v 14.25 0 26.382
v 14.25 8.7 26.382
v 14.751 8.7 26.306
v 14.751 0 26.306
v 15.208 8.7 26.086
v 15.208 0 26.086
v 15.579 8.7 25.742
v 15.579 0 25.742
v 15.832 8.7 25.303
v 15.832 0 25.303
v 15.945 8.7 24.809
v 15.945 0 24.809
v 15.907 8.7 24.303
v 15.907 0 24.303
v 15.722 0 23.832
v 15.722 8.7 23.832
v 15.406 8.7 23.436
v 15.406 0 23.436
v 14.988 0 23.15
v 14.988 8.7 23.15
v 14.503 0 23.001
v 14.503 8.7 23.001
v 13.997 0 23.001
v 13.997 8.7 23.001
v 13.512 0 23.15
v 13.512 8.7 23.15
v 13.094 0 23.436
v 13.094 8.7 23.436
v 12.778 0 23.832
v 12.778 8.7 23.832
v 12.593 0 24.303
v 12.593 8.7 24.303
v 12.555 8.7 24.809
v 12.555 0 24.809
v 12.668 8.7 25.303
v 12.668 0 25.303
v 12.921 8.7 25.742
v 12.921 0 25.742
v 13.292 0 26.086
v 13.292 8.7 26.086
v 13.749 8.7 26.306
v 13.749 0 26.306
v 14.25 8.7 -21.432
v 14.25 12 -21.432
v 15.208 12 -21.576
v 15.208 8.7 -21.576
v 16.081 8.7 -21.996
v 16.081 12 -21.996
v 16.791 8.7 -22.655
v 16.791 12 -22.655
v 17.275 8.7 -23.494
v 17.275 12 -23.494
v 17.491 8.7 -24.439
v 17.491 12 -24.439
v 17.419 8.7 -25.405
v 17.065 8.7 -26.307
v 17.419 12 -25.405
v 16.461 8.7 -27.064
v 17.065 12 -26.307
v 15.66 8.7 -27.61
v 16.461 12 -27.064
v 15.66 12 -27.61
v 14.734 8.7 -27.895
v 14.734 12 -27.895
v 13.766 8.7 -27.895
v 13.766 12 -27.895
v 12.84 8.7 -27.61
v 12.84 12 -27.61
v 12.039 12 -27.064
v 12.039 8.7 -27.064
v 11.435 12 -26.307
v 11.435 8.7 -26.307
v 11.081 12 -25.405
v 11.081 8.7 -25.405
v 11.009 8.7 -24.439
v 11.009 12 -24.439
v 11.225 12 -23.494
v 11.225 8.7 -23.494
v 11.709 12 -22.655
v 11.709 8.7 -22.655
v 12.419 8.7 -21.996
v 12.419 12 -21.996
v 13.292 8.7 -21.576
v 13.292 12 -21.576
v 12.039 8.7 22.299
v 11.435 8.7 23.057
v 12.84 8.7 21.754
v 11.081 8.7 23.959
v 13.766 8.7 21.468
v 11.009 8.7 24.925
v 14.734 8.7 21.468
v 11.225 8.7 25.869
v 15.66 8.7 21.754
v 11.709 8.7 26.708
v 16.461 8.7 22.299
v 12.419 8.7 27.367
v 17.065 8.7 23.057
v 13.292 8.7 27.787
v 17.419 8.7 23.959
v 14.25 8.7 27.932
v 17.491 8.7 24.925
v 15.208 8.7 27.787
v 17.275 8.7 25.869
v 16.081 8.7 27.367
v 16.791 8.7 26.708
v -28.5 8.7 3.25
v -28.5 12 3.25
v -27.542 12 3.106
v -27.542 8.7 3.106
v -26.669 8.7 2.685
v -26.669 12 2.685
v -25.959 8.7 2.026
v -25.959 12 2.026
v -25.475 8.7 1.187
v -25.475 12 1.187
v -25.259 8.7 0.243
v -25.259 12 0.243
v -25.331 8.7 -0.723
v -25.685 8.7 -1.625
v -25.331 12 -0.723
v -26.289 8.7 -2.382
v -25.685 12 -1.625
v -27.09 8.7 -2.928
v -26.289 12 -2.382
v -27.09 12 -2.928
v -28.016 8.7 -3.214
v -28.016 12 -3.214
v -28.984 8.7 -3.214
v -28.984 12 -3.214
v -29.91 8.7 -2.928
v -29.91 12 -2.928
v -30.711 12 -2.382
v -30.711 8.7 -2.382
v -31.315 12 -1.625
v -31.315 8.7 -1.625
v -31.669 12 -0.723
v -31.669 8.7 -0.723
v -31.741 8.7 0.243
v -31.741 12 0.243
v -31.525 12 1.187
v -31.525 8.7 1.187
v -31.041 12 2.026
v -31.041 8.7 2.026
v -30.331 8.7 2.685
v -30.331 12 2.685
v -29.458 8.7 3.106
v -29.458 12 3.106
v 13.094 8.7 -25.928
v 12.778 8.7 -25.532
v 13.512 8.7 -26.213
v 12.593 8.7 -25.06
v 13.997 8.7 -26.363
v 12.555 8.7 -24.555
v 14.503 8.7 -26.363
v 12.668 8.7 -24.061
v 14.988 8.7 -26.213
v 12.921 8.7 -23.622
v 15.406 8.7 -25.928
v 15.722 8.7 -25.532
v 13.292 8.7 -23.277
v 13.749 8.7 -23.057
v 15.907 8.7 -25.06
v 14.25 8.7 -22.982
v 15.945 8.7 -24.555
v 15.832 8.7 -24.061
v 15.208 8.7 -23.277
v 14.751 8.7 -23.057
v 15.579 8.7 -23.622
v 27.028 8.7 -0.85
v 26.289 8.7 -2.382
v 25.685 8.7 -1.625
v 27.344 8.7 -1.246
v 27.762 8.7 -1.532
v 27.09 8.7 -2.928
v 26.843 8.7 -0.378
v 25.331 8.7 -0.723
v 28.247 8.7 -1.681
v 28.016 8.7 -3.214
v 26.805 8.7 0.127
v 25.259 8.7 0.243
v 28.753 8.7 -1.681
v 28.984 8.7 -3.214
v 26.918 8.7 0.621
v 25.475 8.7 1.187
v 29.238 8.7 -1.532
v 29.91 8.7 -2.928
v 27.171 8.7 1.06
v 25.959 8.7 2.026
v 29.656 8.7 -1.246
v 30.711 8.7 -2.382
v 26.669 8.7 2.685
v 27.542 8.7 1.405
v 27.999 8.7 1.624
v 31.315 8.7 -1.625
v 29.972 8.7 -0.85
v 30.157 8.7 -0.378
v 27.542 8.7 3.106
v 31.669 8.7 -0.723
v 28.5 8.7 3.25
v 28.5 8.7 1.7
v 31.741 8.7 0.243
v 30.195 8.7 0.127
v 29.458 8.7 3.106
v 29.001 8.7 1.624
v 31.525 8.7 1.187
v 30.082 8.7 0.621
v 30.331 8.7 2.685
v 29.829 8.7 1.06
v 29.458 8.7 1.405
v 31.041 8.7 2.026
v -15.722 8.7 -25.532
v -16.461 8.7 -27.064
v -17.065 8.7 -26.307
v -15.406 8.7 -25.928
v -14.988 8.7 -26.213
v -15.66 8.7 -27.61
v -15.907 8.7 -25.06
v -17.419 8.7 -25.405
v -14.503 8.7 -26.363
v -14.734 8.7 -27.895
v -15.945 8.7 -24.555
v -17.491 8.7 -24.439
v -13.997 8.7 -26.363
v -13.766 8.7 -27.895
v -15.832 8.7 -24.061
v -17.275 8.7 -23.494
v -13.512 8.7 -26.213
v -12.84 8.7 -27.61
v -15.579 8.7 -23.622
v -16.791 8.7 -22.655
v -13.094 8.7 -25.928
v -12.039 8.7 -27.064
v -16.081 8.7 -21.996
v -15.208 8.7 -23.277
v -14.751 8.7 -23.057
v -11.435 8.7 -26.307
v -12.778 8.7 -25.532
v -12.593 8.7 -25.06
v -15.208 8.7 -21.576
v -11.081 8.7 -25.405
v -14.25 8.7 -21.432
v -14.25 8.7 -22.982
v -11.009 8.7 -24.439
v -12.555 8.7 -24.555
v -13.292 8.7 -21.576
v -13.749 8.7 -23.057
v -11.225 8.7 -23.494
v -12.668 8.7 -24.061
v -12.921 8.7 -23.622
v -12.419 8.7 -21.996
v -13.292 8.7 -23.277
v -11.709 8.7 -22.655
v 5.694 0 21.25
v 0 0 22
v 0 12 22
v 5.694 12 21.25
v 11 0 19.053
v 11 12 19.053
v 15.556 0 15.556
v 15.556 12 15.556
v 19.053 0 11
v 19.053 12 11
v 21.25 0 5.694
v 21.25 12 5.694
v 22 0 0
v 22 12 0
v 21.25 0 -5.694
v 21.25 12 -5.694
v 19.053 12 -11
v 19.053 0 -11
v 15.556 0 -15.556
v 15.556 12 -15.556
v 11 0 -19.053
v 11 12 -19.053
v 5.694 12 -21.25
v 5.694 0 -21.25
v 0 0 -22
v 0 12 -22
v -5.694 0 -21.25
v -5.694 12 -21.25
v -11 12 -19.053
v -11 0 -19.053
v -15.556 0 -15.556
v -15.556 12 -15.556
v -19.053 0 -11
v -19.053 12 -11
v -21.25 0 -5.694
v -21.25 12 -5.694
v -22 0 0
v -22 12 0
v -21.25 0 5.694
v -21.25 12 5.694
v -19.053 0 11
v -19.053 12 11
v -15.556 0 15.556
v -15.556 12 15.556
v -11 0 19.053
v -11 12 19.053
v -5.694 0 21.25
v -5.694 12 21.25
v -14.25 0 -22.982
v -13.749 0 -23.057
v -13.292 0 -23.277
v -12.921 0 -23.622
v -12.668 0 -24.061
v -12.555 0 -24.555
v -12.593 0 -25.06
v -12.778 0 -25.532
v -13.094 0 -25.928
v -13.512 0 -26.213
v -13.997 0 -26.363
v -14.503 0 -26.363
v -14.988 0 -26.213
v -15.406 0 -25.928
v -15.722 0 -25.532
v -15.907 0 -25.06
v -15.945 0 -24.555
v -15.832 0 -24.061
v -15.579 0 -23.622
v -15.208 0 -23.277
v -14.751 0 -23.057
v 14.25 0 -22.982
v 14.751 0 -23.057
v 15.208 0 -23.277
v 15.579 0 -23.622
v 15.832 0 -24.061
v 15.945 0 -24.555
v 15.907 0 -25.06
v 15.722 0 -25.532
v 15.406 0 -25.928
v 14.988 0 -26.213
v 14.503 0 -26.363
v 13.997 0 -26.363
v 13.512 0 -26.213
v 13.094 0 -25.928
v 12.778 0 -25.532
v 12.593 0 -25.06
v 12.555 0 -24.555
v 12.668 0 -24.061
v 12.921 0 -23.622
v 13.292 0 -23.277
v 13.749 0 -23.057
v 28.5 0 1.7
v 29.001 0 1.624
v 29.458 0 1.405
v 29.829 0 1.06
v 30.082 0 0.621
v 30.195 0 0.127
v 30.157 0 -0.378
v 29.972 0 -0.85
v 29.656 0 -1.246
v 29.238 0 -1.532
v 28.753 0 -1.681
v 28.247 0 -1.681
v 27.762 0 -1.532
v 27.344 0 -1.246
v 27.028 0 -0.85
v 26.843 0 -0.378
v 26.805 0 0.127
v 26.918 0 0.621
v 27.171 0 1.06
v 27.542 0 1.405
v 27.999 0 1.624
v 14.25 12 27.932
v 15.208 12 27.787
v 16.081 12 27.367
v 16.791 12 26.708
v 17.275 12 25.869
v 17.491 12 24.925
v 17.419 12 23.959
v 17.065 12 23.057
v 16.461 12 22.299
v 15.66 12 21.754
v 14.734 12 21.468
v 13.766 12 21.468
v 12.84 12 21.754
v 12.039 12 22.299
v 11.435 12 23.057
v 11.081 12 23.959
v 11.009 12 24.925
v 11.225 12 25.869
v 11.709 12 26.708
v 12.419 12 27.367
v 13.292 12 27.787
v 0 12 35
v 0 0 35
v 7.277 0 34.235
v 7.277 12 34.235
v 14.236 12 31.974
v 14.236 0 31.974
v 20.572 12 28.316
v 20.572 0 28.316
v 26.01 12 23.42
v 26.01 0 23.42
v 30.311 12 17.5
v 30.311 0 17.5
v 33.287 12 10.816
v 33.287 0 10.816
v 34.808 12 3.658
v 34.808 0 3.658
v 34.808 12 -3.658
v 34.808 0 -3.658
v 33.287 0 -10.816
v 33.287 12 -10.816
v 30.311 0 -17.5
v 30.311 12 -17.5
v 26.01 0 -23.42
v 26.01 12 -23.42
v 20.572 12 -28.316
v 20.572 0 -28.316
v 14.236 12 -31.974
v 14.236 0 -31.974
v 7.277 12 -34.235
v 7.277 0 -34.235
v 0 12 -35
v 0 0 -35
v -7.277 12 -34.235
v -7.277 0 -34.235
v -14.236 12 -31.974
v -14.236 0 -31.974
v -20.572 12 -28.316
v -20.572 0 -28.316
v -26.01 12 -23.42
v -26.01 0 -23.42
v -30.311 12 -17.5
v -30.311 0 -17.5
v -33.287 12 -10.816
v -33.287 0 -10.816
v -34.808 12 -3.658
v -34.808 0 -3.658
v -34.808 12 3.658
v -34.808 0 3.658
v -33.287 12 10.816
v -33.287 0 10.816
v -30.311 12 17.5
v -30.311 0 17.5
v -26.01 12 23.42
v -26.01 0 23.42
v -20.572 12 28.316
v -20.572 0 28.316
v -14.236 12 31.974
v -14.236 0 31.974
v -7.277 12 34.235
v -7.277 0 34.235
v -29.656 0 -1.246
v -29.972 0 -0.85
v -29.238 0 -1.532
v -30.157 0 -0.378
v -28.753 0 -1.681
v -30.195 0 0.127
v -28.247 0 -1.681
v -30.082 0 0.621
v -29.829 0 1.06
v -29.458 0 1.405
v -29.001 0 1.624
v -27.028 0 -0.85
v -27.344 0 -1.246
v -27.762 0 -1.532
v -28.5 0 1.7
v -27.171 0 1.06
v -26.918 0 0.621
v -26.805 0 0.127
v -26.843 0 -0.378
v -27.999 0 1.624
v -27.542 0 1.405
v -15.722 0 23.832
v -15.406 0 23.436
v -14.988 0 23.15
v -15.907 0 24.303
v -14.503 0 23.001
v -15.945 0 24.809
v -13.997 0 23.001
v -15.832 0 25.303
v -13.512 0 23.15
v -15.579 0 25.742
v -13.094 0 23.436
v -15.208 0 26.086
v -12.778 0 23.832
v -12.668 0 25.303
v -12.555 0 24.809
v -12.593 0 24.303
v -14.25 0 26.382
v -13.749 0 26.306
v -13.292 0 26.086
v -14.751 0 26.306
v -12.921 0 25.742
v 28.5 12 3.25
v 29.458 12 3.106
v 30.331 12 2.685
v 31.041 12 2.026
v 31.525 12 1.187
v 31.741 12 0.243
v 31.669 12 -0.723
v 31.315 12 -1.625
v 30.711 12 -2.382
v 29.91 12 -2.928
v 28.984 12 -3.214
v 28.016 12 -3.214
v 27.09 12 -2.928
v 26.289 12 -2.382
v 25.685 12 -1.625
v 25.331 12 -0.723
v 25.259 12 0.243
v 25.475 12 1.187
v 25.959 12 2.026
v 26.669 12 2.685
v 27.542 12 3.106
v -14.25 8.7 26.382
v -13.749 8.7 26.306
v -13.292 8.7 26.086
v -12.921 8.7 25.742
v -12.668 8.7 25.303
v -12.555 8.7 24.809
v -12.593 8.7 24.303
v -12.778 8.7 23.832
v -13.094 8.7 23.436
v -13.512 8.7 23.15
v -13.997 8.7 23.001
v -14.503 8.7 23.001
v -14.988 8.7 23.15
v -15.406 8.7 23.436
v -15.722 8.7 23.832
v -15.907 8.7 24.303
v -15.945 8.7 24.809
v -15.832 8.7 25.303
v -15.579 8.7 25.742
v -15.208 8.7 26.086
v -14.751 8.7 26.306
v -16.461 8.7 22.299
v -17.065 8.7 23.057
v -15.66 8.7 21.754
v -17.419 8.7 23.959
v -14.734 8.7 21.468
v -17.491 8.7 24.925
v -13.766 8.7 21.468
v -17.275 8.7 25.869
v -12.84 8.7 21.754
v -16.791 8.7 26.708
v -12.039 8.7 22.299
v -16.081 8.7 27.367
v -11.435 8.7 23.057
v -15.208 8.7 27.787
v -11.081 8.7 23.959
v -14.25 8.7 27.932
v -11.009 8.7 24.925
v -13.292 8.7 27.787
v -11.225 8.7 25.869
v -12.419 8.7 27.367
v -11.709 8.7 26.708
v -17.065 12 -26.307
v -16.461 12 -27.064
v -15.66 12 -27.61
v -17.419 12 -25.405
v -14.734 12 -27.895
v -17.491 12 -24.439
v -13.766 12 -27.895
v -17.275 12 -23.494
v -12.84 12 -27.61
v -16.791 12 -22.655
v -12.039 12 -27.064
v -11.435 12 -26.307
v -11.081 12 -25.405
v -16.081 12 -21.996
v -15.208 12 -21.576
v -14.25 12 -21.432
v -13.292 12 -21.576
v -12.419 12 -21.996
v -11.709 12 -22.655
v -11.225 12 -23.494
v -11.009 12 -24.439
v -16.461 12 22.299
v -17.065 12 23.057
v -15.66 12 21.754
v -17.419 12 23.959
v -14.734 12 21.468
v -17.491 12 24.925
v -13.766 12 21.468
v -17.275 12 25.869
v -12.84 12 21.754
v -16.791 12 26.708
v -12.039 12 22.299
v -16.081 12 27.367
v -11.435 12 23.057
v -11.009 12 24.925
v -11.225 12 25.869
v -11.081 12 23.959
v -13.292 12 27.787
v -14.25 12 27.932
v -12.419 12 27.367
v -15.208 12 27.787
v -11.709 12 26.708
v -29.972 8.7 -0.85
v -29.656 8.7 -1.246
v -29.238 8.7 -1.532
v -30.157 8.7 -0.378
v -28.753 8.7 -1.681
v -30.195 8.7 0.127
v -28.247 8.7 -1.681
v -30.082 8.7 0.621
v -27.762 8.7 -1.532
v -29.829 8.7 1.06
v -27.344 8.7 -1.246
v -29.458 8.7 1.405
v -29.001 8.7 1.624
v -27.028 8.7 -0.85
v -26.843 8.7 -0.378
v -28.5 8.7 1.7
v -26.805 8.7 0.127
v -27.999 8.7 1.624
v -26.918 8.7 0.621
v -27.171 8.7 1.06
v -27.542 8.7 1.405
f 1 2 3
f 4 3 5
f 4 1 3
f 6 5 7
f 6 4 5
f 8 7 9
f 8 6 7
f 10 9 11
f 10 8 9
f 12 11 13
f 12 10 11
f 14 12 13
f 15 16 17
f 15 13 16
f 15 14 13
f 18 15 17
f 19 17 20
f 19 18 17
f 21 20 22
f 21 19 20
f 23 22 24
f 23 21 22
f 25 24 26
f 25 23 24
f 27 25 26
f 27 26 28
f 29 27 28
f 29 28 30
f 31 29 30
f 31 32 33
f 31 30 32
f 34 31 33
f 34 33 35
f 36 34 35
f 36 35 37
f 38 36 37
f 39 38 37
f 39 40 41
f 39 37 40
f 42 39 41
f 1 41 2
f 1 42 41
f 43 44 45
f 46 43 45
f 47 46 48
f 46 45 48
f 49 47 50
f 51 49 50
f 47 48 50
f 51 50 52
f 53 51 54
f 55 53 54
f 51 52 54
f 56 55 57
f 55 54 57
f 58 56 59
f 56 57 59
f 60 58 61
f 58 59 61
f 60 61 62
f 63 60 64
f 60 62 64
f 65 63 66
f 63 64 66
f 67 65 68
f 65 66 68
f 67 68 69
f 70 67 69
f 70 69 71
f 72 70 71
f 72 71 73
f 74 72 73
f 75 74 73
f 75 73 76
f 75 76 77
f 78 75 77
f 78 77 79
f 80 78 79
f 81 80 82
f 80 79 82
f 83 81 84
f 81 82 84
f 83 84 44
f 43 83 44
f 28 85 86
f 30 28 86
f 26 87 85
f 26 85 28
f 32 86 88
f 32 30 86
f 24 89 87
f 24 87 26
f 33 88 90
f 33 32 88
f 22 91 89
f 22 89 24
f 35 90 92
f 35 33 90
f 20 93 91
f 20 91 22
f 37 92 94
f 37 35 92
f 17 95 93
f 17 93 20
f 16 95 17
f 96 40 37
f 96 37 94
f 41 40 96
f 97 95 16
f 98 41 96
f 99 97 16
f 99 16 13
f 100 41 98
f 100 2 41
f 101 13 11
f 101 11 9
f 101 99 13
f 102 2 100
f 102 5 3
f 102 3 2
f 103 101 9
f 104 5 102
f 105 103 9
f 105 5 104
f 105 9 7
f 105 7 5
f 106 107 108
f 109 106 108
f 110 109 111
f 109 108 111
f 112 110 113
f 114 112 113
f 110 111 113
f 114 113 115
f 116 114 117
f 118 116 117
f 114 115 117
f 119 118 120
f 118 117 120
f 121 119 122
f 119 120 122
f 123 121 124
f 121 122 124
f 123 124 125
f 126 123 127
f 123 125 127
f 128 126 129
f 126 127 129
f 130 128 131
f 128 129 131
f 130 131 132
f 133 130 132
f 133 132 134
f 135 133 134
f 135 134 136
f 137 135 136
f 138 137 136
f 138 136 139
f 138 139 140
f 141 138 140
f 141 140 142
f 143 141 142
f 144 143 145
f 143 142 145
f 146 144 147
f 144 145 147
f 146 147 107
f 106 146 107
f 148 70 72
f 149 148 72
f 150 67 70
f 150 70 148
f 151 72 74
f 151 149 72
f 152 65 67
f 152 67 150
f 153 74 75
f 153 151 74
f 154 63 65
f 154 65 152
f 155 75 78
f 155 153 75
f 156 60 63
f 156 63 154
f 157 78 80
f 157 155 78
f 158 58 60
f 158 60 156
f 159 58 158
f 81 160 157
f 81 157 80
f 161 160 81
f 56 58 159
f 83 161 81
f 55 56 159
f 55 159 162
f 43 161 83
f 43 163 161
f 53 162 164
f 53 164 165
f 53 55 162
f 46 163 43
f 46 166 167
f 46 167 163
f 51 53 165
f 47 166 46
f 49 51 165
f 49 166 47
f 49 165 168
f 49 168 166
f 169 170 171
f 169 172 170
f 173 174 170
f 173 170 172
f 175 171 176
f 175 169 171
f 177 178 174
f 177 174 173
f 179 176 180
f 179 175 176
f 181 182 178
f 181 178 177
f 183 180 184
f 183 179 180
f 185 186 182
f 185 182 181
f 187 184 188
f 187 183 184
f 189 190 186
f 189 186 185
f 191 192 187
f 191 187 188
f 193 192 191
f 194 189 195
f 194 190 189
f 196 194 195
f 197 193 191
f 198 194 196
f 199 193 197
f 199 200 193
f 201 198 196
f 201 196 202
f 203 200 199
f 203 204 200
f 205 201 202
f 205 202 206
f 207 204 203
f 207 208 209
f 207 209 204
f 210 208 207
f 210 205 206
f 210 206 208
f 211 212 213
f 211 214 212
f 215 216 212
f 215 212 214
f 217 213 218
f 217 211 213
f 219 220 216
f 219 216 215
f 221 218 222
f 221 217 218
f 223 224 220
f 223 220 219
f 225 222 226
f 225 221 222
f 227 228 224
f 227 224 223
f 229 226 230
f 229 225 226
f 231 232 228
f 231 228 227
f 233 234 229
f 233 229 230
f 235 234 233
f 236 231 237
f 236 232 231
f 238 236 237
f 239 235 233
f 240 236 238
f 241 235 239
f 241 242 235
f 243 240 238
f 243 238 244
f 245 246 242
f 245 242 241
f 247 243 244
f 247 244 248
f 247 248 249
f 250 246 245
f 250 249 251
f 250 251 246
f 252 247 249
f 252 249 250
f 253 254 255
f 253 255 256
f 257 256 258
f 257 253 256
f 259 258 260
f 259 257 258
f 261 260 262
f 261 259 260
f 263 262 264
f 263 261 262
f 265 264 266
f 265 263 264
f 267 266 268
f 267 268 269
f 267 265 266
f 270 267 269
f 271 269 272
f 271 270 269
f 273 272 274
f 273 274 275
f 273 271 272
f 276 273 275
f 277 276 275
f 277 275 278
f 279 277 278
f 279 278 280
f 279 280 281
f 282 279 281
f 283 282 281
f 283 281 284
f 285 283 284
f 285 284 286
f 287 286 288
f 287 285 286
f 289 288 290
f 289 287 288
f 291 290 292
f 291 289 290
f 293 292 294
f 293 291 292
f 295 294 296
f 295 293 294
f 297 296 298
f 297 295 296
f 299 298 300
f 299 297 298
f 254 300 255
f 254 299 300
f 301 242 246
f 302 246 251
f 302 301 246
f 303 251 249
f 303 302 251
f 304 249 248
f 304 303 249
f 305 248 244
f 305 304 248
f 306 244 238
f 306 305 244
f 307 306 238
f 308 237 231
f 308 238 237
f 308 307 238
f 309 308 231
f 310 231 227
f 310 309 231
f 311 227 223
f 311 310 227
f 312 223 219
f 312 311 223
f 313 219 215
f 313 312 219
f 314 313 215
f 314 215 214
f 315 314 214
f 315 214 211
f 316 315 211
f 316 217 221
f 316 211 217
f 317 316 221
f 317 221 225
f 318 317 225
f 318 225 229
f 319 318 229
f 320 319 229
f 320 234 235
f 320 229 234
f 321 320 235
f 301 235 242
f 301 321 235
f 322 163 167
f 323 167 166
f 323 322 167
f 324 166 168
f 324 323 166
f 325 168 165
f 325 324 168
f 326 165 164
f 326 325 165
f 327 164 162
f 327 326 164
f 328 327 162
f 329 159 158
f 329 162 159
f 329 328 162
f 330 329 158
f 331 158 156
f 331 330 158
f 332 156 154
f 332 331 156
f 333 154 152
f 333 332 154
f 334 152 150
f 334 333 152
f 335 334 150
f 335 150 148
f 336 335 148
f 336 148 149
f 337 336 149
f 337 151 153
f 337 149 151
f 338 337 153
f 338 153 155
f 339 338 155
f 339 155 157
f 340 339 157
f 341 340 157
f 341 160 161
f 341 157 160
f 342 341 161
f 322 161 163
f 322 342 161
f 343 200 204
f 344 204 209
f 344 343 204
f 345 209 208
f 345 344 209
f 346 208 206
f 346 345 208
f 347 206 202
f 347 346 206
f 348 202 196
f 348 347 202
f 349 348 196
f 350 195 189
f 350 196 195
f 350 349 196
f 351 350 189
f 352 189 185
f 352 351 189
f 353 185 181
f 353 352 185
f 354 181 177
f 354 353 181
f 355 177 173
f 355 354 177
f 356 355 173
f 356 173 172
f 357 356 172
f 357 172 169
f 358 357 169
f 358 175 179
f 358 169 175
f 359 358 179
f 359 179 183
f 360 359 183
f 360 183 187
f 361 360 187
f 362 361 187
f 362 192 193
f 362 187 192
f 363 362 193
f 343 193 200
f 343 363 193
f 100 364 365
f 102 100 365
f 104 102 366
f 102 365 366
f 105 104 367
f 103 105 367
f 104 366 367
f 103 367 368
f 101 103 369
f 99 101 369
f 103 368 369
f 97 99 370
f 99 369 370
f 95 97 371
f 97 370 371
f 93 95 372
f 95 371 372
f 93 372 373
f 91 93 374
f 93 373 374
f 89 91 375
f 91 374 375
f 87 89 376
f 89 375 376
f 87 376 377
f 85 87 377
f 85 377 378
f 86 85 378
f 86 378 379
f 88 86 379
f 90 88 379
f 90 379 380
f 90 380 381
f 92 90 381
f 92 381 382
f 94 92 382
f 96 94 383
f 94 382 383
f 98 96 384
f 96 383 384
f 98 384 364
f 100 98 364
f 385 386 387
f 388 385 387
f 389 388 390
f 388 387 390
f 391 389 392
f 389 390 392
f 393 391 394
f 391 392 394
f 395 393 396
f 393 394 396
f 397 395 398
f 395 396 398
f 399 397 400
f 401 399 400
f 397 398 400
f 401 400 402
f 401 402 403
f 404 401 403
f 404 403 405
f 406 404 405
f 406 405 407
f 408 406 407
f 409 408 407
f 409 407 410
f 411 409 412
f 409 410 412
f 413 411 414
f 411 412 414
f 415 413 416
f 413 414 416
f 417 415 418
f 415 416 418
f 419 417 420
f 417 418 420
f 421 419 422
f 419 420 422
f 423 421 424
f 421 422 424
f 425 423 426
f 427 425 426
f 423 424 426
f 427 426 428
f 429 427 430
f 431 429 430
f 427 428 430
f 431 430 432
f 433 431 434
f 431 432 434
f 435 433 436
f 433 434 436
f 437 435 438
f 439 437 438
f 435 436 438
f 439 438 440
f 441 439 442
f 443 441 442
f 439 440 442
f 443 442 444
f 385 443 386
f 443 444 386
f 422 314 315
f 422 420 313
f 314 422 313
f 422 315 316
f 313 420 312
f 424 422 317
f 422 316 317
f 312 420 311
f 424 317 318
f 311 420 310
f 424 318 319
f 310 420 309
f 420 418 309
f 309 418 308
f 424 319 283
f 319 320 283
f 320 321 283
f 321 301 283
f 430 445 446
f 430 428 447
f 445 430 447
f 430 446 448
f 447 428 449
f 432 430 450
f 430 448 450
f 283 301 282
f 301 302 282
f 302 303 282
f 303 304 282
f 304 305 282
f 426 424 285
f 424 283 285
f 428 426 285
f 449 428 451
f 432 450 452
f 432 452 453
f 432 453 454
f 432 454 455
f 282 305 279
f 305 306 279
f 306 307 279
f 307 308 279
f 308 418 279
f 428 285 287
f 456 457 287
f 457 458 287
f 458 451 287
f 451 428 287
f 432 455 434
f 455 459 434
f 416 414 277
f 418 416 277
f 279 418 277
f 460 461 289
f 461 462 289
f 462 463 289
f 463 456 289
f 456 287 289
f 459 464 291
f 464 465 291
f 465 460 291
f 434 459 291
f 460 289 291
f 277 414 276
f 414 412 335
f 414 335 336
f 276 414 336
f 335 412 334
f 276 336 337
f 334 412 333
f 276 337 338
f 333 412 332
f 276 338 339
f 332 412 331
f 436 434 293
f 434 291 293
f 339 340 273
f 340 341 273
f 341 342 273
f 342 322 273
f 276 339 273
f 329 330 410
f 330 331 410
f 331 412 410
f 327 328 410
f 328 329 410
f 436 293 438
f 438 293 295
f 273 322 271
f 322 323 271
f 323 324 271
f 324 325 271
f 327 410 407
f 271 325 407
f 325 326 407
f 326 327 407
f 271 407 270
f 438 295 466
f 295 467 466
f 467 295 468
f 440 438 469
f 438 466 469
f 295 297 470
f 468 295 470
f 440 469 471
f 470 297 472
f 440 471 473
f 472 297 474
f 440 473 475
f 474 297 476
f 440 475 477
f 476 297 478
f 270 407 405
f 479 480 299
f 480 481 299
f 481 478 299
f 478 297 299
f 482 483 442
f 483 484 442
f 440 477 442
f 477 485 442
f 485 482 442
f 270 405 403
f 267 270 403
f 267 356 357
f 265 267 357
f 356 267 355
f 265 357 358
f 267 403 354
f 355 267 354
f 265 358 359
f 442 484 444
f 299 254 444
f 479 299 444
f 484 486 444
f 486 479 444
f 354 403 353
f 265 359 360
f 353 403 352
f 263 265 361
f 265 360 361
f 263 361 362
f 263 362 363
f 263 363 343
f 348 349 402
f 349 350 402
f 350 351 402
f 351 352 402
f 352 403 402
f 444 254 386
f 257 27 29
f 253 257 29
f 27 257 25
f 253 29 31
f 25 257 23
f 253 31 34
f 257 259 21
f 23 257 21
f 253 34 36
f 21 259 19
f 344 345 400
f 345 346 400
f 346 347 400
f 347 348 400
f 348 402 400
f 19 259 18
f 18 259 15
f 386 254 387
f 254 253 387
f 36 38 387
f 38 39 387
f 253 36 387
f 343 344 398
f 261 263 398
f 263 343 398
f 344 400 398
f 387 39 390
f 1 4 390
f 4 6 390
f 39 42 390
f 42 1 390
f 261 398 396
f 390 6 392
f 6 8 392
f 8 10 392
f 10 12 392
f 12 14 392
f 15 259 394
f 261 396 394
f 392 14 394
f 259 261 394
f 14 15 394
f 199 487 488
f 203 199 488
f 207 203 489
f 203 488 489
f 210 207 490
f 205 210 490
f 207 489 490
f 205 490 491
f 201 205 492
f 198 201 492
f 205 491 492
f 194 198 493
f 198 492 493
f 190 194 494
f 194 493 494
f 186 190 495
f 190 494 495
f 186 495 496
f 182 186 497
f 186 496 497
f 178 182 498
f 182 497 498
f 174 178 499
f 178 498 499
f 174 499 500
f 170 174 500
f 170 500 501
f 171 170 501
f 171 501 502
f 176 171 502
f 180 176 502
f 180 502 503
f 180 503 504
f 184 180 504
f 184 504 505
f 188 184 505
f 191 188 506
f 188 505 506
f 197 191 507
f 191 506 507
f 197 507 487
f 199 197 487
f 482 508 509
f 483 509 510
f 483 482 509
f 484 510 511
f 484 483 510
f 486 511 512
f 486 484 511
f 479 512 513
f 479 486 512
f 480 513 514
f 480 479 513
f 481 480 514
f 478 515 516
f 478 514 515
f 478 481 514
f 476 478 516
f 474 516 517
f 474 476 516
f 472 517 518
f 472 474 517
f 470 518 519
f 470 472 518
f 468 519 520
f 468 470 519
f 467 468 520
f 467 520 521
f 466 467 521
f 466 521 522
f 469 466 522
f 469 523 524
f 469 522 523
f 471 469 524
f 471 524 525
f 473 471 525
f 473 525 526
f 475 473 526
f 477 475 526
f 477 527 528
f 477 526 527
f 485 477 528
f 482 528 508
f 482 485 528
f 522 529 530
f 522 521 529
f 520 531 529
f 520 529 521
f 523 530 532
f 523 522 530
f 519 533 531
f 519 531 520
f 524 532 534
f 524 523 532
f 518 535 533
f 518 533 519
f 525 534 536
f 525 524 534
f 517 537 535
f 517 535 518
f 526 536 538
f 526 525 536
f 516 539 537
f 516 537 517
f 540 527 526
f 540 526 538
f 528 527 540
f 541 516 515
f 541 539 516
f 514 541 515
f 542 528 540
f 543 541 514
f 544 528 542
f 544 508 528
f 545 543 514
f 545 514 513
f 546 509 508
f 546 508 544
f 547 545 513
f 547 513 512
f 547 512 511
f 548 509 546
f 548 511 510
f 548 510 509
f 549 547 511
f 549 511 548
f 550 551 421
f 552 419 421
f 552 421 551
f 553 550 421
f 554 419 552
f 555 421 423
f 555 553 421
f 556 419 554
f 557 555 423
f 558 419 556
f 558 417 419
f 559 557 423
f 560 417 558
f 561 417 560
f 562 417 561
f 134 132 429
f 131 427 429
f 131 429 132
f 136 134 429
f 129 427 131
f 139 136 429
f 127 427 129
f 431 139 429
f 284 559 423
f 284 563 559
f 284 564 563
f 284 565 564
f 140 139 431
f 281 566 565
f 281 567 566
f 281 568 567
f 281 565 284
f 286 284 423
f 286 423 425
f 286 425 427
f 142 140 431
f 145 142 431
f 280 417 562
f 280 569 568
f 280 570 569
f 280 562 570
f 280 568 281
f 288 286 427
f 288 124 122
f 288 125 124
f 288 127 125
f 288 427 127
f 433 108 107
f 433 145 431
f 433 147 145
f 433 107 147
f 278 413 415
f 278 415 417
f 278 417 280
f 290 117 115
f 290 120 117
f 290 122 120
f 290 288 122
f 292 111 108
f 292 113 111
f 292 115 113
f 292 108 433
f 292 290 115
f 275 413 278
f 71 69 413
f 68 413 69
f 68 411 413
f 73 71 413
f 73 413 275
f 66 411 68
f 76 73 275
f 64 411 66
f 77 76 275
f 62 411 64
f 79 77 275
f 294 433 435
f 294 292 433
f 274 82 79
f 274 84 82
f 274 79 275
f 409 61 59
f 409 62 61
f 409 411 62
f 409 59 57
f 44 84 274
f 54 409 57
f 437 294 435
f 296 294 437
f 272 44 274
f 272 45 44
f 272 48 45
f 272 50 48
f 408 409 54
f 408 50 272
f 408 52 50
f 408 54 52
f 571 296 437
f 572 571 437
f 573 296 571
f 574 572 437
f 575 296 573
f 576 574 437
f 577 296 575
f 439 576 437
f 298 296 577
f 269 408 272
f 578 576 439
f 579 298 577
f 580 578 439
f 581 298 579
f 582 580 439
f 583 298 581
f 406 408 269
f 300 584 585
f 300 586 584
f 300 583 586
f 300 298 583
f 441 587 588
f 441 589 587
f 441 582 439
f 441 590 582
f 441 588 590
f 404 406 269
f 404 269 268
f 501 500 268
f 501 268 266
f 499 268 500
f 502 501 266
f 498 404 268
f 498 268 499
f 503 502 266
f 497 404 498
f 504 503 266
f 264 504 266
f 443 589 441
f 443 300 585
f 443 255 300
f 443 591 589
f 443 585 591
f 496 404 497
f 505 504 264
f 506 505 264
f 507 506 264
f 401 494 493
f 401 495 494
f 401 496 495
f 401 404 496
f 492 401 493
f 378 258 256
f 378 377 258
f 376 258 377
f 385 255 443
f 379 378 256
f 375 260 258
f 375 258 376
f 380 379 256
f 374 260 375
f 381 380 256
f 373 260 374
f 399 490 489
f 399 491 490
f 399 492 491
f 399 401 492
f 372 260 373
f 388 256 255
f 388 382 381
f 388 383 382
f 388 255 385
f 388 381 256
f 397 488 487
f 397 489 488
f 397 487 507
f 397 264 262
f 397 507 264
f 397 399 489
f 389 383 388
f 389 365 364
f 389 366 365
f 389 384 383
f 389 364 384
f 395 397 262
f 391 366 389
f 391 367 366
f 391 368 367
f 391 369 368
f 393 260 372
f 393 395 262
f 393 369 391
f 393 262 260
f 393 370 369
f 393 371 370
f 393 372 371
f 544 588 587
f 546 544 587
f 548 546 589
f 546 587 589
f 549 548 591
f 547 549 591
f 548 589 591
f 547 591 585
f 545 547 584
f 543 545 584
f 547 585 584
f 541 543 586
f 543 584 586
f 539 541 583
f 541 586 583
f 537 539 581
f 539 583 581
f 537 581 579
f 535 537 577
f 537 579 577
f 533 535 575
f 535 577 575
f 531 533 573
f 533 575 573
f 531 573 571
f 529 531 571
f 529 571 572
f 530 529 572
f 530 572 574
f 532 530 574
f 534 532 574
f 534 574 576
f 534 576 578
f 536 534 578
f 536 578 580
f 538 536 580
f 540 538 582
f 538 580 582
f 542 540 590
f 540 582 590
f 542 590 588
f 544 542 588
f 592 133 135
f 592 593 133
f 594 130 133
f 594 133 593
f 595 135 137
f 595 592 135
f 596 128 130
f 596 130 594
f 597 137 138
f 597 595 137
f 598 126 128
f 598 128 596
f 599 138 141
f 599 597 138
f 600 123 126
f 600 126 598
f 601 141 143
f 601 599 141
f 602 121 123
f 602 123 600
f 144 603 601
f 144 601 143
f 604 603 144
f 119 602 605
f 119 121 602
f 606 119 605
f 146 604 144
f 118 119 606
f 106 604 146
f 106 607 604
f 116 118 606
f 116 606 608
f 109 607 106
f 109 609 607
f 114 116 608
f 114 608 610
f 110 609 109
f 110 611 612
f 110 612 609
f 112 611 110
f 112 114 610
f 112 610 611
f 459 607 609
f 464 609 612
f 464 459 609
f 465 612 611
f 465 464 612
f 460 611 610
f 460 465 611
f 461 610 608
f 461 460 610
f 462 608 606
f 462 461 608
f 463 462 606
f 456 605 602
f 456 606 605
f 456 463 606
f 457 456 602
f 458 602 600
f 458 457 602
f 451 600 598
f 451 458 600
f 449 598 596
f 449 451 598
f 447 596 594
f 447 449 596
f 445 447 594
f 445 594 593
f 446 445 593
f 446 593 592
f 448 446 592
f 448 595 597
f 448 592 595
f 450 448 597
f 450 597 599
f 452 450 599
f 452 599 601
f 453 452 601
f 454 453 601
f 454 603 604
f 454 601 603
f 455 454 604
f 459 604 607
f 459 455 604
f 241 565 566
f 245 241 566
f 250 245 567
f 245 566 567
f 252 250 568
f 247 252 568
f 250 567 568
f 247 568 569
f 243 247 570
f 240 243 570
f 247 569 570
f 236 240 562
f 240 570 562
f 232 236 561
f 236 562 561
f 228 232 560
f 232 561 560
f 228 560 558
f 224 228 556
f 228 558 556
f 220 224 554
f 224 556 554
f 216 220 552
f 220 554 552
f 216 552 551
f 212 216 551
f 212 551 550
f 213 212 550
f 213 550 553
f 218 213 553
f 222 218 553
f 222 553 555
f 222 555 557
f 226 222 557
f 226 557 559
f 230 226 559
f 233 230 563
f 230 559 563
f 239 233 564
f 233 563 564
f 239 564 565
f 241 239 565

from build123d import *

# Parameters (mm, degrees)
SKETCH_1_R          = 35
SKETCH_1_R_2        = 1.7
SKETCH_1_R_3        = 22
EXTRUDE_1_DEPTH     = 12
SKETCH_2_R          = 3.25
CUT_EXTRUDE_1_DEPTH = 3.3


with BuildPart() as part:
    # 草图1 → 凸台-拉伸1 (new body)
    with BuildSketch(Plane(origin=(0, 0, 0), x_dir=(1, 0, 0), z_dir=(0, 1, 0))):
        with Locations(Location((0, 0, 0), (0, 0, 270))):
            Circle(SKETCH_1_R)
        with Locations(Location((-28.5, 0, 0), (0, 0, 270))):
            Circle(SKETCH_1_R_2, mode=Mode.SUBTRACT)
        with Locations(Location((-14.25, 24.681724008, 0), (0, 0, 270))):
            Circle(SKETCH_1_R_2, mode=Mode.SUBTRACT)
        with Locations(Location((14.25, 24.681724008, 0), (0, 0, 270))):
            Circle(SKETCH_1_R_2, mode=Mode.SUBTRACT)
        with Locations(Location((28.5, 0, 0), (0, 0, 270))):
            Circle(SKETCH_1_R_2, mode=Mode.SUBTRACT)
        with Locations(Location((14.25, -24.681724008, 0), (0, 0, 270))):
            Circle(SKETCH_1_R_2, mode=Mode.SUBTRACT)
        with Locations(Location((-14.25, -24.681724008, 0), (0, 0, 270))):
            Circle(SKETCH_1_R_2, mode=Mode.SUBTRACT)
        with Locations(Location((0, 0, 0), (0, 0, 270))):
            Circle(SKETCH_1_R_3, mode=Mode.SUBTRACT)
    extrude(amount=EXTRUDE_1_DEPTH)

    # 草图2 → 切除-拉伸1 (cut)
    with BuildSketch(Plane(origin=(0, 12, 0), x_dir=(1, 0, 0), z_dir=(0, 1, 0))):
        with Locations(Location((-28.5, 0, 0), (0, 0, 270))):
            Circle(SKETCH_2_R)
        with Locations(Location((-14.25, 24.681724008, 0), (0, 0, 270))):
            Circle(SKETCH_2_R)
        with Locations(Location((14.25, 24.681724008, 0), (0, 0, 270))):
            Circle(SKETCH_2_R)
        with Locations(Location((28.5, 0, 0), (0, 0, 270))):
            Circle(SKETCH_2_R)
        with Locations(Location((14.25, -24.681724008, 0), (0, 0, 270))):
            Circle(SKETCH_2_R)
        with Locations(Location((-14.25, -24.681724008, 0), (0, 0, 270))):
            Circle(SKETCH_2_R)
    extrude(amount=-CUT_EXTRUDE_1_DEPTH, mode=Mode.SUBTRACT)


solid = part.part
